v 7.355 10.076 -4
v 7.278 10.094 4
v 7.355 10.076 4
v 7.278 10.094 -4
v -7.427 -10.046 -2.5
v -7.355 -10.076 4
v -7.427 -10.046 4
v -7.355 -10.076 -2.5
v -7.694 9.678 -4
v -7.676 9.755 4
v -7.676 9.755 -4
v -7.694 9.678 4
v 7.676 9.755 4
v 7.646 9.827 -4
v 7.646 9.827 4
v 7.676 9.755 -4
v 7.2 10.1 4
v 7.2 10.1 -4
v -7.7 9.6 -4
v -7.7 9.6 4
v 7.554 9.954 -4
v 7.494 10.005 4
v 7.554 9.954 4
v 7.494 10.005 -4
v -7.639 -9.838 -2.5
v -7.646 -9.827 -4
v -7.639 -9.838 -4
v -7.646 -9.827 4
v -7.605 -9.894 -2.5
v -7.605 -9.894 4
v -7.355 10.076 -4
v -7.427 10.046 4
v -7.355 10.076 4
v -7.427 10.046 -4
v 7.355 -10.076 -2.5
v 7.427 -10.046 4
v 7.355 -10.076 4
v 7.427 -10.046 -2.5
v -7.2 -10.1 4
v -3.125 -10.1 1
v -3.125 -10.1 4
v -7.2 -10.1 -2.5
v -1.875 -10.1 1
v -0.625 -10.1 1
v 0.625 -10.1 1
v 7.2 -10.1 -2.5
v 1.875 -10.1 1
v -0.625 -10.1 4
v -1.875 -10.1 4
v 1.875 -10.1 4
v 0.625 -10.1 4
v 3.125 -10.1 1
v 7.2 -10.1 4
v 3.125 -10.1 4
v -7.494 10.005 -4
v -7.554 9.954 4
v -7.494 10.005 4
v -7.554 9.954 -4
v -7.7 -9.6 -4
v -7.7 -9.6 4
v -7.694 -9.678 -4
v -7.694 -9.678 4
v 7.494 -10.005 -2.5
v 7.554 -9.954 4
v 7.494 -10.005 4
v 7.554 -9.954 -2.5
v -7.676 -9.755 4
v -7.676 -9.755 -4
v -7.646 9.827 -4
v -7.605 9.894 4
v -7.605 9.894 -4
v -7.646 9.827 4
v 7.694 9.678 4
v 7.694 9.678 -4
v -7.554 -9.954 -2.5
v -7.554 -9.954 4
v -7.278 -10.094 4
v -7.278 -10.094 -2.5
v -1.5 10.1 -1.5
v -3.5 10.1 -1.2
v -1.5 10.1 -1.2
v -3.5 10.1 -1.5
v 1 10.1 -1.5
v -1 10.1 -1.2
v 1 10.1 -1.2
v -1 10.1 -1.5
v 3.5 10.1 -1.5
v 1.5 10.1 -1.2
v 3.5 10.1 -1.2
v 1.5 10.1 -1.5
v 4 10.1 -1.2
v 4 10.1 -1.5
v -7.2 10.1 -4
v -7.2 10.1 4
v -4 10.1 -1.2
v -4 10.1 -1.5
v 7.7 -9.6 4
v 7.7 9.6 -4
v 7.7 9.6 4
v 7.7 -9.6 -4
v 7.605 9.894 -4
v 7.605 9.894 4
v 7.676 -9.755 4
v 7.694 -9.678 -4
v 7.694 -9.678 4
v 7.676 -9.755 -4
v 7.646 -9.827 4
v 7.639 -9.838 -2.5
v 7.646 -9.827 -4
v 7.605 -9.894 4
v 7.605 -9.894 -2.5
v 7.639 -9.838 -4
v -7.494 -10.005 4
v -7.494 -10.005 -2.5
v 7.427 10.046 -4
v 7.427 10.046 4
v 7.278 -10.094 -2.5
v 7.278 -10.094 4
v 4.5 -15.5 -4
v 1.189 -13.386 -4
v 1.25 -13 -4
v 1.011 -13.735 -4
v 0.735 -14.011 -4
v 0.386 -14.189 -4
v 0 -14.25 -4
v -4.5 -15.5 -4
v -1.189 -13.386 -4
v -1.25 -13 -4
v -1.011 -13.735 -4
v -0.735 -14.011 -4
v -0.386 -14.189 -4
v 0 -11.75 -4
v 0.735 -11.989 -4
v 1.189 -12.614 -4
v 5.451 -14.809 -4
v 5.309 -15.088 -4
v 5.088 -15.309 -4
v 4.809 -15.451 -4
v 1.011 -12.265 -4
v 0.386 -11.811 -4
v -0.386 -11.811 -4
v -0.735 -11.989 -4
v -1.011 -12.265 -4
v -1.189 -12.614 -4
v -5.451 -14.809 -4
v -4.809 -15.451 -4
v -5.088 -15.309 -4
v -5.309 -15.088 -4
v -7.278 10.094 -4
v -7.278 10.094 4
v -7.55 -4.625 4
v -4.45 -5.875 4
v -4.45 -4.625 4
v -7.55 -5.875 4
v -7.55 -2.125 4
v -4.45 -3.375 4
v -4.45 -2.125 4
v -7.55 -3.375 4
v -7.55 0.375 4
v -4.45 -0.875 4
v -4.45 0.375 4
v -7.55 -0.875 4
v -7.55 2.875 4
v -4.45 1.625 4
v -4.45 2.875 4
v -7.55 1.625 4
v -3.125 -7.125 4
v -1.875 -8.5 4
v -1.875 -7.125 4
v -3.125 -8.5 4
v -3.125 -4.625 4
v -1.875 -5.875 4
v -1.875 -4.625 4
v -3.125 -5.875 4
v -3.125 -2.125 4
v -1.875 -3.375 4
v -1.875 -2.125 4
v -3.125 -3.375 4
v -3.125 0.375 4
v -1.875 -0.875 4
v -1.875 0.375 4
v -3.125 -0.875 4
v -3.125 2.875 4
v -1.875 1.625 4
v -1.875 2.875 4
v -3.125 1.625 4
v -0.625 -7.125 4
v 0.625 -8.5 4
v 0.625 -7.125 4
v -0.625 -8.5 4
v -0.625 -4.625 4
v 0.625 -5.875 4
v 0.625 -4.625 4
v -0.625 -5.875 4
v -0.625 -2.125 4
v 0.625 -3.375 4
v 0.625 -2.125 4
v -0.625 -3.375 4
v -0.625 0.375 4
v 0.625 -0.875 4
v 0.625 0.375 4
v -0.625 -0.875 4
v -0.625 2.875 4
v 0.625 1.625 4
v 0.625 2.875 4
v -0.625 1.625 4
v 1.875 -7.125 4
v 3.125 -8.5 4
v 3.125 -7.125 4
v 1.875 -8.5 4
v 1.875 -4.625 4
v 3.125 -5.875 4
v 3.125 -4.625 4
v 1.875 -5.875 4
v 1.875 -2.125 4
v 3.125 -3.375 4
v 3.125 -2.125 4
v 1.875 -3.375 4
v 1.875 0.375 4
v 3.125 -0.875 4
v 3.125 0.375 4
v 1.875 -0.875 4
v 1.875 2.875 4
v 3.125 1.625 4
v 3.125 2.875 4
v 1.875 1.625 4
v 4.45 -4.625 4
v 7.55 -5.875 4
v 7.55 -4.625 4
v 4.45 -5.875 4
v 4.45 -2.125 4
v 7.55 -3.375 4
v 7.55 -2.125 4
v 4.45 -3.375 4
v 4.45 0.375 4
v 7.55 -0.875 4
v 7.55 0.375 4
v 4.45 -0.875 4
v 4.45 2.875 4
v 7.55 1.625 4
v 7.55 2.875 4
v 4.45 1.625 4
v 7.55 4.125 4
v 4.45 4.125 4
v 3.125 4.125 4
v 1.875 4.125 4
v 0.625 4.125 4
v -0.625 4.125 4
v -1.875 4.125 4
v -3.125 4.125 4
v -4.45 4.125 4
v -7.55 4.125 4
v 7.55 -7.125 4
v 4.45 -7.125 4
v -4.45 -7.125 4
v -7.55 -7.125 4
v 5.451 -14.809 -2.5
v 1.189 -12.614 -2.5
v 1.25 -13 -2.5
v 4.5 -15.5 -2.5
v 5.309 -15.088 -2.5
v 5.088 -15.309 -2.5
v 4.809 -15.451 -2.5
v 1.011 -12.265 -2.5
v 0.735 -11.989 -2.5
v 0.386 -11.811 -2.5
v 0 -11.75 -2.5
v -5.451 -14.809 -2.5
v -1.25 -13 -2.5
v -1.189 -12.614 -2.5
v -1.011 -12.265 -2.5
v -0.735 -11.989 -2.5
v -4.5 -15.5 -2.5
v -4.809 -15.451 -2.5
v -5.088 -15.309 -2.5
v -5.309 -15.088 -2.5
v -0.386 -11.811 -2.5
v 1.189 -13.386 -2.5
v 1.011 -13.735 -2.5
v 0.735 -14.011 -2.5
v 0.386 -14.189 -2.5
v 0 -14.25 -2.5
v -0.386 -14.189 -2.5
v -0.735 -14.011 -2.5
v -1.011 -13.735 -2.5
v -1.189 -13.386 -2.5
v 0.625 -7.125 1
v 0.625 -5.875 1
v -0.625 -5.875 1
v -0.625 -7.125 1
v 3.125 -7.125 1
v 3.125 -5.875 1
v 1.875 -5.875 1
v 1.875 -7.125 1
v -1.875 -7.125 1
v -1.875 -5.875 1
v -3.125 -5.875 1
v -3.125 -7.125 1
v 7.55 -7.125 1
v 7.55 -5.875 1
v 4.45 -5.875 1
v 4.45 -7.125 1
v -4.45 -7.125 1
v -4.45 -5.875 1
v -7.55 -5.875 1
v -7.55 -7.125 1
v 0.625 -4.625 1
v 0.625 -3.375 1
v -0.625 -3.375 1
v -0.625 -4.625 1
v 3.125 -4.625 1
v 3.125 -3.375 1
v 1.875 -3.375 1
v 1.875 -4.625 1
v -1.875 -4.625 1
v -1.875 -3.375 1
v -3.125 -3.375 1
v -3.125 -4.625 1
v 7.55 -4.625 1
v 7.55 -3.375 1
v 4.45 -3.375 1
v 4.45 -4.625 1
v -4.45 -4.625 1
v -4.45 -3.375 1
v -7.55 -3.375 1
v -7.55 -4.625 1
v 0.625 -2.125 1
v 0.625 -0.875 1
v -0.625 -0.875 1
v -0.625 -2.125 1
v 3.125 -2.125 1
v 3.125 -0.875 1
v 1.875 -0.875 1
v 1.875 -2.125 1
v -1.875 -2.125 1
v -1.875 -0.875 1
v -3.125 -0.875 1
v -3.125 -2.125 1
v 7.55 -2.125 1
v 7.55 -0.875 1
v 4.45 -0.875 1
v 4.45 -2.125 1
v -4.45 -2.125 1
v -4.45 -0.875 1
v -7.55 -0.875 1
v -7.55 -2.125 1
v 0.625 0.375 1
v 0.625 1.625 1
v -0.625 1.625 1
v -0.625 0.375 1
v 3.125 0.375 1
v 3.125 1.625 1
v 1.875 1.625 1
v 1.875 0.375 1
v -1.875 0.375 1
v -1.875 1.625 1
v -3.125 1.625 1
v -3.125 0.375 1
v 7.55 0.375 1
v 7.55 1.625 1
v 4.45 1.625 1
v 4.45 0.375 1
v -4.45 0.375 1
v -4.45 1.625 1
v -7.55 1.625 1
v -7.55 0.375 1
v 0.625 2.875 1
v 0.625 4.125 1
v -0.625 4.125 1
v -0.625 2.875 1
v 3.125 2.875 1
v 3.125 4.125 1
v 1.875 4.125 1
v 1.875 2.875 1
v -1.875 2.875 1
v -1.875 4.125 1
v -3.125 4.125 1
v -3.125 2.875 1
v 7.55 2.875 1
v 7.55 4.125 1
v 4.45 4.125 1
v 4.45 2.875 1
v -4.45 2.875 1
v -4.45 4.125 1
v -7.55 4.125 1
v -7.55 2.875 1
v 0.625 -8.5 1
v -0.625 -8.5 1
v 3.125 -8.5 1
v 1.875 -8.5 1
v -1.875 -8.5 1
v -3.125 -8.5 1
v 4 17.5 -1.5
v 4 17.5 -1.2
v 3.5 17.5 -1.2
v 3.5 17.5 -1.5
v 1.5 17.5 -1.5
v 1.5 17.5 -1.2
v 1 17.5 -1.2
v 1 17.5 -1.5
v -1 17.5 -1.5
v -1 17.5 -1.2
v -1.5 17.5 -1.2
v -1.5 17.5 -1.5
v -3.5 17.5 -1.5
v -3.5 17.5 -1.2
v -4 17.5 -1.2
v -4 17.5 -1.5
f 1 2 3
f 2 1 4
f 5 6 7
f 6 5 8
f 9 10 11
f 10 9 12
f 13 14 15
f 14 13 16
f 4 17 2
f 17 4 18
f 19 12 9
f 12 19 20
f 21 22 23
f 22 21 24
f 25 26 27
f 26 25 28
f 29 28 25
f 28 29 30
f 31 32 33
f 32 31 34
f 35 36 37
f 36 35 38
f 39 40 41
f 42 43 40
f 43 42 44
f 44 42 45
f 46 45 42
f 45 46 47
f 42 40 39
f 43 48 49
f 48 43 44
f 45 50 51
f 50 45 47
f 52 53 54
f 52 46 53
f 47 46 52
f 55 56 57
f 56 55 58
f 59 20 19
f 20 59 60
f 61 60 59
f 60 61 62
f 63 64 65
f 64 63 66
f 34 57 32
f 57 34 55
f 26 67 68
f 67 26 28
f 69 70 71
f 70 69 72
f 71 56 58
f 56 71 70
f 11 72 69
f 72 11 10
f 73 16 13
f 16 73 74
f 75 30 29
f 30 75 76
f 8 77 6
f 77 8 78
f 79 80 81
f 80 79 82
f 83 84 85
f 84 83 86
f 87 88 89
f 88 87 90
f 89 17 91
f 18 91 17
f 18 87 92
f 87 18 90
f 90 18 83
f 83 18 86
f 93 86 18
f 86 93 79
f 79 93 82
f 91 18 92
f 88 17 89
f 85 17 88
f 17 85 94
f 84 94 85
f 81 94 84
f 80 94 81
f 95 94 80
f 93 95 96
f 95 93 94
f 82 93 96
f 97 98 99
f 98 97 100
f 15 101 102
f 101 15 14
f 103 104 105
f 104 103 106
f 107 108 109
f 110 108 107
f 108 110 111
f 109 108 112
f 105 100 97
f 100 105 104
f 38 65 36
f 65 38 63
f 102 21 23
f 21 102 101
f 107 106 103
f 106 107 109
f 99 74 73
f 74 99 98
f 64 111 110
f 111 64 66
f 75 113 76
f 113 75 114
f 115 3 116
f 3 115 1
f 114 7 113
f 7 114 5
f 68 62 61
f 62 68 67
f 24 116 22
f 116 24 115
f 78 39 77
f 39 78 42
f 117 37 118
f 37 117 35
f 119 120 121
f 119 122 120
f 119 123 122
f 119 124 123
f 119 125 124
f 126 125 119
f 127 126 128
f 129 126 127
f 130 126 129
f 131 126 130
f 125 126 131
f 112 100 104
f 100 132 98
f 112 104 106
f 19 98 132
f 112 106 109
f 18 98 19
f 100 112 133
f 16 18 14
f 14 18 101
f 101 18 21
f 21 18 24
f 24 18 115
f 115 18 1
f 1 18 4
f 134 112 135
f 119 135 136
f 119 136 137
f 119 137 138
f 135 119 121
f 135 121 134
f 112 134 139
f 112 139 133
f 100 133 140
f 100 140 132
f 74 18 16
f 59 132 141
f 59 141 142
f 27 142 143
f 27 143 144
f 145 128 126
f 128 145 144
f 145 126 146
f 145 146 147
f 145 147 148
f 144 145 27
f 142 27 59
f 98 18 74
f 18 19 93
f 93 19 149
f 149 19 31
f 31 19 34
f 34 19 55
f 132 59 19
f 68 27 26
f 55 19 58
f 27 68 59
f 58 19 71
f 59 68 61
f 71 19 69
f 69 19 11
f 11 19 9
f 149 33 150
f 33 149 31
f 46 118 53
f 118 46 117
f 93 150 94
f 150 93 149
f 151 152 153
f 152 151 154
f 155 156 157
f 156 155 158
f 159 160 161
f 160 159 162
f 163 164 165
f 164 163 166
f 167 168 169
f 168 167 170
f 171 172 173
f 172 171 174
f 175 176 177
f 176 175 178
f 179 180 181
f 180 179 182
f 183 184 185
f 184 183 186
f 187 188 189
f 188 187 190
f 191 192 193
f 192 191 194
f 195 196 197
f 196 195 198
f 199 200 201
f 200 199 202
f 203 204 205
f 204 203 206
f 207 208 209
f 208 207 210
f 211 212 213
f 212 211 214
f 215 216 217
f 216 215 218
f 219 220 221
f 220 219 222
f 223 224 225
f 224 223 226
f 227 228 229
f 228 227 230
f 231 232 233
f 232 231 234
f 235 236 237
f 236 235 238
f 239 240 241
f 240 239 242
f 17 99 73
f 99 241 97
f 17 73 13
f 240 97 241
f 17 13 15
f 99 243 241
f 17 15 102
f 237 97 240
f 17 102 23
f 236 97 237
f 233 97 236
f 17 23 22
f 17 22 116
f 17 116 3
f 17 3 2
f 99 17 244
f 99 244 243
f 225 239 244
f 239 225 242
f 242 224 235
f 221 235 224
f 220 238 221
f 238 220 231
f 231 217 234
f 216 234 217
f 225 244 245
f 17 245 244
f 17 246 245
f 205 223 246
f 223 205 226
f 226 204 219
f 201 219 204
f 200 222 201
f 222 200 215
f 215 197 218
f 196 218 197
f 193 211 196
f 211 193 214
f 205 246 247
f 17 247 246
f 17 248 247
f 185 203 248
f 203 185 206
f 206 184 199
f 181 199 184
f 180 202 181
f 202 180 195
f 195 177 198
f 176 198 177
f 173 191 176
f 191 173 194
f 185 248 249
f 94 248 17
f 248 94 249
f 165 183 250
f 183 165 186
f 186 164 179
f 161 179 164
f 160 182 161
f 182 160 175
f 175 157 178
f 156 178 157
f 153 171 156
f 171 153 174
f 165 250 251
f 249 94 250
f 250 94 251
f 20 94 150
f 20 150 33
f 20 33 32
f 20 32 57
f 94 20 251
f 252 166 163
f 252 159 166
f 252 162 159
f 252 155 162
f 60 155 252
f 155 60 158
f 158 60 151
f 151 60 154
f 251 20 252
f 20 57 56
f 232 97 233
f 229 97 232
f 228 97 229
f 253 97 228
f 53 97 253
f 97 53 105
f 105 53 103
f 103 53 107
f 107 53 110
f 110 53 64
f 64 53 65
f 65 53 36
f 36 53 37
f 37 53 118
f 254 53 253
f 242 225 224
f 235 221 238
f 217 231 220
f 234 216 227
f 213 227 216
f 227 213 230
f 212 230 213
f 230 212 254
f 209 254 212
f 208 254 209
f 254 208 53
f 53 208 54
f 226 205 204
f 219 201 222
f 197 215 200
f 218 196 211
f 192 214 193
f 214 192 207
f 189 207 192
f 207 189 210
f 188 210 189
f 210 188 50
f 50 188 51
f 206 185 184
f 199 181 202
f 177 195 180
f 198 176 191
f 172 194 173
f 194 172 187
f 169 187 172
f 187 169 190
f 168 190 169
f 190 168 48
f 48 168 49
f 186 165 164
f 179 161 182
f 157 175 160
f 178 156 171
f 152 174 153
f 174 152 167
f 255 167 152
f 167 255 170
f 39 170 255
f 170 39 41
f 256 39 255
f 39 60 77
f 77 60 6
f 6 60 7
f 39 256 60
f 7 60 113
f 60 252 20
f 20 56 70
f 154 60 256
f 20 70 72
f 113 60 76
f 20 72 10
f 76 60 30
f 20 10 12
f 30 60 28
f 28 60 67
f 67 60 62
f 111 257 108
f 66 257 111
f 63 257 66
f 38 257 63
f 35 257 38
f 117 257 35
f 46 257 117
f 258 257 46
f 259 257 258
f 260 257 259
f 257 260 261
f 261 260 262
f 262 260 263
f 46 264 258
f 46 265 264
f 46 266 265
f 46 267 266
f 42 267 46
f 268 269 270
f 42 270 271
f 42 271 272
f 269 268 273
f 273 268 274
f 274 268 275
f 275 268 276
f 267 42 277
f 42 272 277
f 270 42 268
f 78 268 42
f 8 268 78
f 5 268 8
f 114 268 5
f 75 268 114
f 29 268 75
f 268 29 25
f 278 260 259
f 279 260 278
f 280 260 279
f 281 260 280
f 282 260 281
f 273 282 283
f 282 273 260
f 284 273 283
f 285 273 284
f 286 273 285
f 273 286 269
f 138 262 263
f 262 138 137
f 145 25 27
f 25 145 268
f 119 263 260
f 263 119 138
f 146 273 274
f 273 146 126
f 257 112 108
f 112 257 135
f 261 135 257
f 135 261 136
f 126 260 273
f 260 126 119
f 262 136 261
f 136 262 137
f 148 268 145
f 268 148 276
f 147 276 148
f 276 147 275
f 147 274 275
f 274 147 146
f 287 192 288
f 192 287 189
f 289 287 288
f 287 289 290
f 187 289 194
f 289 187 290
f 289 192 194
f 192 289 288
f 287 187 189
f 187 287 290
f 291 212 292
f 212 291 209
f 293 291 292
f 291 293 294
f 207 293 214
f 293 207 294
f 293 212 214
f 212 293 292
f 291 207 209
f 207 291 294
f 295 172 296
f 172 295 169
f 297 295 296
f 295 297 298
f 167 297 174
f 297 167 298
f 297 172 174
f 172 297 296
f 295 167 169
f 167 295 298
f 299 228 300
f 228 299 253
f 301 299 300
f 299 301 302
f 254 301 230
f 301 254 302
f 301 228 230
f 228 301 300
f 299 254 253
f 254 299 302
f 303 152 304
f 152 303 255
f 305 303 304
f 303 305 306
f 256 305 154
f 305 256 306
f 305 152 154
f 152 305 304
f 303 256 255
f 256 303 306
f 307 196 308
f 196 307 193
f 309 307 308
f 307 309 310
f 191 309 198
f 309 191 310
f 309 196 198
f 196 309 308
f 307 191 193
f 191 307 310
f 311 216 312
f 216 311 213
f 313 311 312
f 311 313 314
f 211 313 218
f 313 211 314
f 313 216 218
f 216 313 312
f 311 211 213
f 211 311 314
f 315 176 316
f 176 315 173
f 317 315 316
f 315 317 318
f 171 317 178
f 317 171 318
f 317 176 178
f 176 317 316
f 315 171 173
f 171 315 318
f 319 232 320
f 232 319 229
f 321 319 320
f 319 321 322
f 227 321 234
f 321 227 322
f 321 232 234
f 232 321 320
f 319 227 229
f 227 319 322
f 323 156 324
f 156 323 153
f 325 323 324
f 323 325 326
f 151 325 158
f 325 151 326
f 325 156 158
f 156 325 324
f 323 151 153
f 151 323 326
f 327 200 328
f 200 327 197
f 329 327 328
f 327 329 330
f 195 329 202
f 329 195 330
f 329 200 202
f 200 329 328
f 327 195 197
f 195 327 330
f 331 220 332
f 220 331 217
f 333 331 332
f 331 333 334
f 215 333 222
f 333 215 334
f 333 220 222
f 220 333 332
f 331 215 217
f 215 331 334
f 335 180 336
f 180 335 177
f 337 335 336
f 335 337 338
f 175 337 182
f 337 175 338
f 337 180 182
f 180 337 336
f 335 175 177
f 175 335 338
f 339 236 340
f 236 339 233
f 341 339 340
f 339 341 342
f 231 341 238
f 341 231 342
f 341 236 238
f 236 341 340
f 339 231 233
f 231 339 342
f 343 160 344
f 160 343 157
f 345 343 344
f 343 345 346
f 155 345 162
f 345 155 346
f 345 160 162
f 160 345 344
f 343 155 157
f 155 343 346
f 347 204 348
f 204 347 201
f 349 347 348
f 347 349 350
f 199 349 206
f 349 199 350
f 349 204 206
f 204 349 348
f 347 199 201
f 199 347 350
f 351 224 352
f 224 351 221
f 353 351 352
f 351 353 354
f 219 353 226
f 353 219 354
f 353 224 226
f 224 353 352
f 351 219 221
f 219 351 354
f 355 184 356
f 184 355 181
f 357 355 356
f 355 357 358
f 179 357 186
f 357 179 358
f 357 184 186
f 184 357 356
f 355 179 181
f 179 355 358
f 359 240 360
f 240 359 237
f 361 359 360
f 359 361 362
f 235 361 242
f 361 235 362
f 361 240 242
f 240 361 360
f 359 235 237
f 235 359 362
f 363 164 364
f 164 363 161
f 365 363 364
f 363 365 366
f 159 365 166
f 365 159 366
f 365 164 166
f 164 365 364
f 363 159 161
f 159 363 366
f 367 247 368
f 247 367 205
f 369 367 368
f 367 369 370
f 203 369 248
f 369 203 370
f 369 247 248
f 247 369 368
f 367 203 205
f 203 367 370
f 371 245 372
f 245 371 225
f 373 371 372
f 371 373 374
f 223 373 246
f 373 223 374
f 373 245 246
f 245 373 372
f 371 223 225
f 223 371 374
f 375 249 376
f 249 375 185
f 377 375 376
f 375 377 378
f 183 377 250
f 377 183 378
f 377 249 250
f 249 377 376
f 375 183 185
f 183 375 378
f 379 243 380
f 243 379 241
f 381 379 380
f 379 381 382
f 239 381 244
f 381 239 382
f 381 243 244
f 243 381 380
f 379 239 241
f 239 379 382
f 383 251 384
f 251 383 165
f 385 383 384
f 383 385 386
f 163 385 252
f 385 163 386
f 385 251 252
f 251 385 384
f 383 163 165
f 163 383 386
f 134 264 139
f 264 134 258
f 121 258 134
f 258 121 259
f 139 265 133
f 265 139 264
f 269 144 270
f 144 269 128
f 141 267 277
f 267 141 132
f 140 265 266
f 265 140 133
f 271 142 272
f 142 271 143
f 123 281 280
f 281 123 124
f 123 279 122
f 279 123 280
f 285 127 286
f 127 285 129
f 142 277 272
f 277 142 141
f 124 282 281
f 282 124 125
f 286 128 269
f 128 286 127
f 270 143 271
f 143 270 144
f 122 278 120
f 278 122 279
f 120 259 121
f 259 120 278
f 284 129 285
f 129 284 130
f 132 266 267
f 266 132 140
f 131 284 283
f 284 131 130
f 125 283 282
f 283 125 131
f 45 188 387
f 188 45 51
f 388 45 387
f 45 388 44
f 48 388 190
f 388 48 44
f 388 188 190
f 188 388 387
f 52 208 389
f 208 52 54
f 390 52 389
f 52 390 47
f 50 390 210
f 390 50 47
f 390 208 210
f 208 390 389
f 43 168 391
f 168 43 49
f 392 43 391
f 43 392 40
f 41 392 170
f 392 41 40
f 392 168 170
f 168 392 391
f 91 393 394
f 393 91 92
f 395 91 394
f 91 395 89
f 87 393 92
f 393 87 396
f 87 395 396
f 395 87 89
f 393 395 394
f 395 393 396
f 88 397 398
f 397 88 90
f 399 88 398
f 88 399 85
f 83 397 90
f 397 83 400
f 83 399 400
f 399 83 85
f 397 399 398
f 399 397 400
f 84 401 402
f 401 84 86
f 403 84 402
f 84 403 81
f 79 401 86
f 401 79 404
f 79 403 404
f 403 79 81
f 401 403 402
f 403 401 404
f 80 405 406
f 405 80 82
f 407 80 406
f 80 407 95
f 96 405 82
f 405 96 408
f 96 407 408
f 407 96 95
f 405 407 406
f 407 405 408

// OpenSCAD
q=4;

module rcube(siz, rad) {
    xi = max(0,siz[0]/2-rad);
    yi = max(0,siz[1]/2-rad);
    hi =  siz[2];

    hull() {
        translate([ xi, yi,0]) cylinder(r=rad,h=hi, center=true, $fn=10*q);
        translate([-xi, yi,0]) cylinder(r=rad,h=hi, center=true, $fn=10*q);
        translate([ xi,-yi,0]) cylinder(r=rad,h=hi, center=true, $fn=10*q);
        translate([-xi,-yi,0]) cylinder(r=rad,h=hi, center=true, $fn=10*q);
  }
}

module DHT22() {
    difference() {
        color([0.99,0.99,0.99]) union(){
            rcube([15.4,20.2,8],0.5);
            hull() {
                translate([ 7.2, -9.6,-4]) cylinder(d=1,h=1.5,$fn=5*q);
                translate([-7.2, -9.6,-4]) cylinder(d=1,h=1.5,$fn=5*q);
                translate([ 4.5,-14.5,-4]) cylinder(d=2,h=1.5,$fn=5*q);
                translate([-4.5,-14.5,-4]) cylinder(d=2,h=1.5,$fn=5*q);
            }
        }
        translate([ 0.0,-13,-4]) cylinder(d=2.5,h=10,center=true, $fn=5*q);
        for(i = [1:5]) {
            translate([ 0  , -9+2.5*i,4]) cube([1.25,1.25,6], center=true);
            translate([ 2.5, -9+2.5*i,4]) cube([1.25,1.25,6], center=true);
            translate([-2.5, -9+2.5*i,4]) cube([1.25,1.25,6], center=true);
            translate([ 6  , -9+2.5*i,4]) cube([3.1,1.25,6], center=true);
            translate([-6  , -9+2.5*i,4]) cube([3.1,1.25,6], center=true);
        }
            translate([ 0  , -10,4]) cube([1.25,3,6], center=true);
            translate([ 2.5, -10,4]) cube([1.25,3,6], center=true);
            translate([-2.5, -10,4]) cube([1.25,3,6], center=true);           
    }
    color("Grey"     ) for(i = [1:4]) {
        translate([ 6-2.5*i  , 10,-1.5]) cube([0.5,7.5,0.3]);
    }
}
DHT22();
